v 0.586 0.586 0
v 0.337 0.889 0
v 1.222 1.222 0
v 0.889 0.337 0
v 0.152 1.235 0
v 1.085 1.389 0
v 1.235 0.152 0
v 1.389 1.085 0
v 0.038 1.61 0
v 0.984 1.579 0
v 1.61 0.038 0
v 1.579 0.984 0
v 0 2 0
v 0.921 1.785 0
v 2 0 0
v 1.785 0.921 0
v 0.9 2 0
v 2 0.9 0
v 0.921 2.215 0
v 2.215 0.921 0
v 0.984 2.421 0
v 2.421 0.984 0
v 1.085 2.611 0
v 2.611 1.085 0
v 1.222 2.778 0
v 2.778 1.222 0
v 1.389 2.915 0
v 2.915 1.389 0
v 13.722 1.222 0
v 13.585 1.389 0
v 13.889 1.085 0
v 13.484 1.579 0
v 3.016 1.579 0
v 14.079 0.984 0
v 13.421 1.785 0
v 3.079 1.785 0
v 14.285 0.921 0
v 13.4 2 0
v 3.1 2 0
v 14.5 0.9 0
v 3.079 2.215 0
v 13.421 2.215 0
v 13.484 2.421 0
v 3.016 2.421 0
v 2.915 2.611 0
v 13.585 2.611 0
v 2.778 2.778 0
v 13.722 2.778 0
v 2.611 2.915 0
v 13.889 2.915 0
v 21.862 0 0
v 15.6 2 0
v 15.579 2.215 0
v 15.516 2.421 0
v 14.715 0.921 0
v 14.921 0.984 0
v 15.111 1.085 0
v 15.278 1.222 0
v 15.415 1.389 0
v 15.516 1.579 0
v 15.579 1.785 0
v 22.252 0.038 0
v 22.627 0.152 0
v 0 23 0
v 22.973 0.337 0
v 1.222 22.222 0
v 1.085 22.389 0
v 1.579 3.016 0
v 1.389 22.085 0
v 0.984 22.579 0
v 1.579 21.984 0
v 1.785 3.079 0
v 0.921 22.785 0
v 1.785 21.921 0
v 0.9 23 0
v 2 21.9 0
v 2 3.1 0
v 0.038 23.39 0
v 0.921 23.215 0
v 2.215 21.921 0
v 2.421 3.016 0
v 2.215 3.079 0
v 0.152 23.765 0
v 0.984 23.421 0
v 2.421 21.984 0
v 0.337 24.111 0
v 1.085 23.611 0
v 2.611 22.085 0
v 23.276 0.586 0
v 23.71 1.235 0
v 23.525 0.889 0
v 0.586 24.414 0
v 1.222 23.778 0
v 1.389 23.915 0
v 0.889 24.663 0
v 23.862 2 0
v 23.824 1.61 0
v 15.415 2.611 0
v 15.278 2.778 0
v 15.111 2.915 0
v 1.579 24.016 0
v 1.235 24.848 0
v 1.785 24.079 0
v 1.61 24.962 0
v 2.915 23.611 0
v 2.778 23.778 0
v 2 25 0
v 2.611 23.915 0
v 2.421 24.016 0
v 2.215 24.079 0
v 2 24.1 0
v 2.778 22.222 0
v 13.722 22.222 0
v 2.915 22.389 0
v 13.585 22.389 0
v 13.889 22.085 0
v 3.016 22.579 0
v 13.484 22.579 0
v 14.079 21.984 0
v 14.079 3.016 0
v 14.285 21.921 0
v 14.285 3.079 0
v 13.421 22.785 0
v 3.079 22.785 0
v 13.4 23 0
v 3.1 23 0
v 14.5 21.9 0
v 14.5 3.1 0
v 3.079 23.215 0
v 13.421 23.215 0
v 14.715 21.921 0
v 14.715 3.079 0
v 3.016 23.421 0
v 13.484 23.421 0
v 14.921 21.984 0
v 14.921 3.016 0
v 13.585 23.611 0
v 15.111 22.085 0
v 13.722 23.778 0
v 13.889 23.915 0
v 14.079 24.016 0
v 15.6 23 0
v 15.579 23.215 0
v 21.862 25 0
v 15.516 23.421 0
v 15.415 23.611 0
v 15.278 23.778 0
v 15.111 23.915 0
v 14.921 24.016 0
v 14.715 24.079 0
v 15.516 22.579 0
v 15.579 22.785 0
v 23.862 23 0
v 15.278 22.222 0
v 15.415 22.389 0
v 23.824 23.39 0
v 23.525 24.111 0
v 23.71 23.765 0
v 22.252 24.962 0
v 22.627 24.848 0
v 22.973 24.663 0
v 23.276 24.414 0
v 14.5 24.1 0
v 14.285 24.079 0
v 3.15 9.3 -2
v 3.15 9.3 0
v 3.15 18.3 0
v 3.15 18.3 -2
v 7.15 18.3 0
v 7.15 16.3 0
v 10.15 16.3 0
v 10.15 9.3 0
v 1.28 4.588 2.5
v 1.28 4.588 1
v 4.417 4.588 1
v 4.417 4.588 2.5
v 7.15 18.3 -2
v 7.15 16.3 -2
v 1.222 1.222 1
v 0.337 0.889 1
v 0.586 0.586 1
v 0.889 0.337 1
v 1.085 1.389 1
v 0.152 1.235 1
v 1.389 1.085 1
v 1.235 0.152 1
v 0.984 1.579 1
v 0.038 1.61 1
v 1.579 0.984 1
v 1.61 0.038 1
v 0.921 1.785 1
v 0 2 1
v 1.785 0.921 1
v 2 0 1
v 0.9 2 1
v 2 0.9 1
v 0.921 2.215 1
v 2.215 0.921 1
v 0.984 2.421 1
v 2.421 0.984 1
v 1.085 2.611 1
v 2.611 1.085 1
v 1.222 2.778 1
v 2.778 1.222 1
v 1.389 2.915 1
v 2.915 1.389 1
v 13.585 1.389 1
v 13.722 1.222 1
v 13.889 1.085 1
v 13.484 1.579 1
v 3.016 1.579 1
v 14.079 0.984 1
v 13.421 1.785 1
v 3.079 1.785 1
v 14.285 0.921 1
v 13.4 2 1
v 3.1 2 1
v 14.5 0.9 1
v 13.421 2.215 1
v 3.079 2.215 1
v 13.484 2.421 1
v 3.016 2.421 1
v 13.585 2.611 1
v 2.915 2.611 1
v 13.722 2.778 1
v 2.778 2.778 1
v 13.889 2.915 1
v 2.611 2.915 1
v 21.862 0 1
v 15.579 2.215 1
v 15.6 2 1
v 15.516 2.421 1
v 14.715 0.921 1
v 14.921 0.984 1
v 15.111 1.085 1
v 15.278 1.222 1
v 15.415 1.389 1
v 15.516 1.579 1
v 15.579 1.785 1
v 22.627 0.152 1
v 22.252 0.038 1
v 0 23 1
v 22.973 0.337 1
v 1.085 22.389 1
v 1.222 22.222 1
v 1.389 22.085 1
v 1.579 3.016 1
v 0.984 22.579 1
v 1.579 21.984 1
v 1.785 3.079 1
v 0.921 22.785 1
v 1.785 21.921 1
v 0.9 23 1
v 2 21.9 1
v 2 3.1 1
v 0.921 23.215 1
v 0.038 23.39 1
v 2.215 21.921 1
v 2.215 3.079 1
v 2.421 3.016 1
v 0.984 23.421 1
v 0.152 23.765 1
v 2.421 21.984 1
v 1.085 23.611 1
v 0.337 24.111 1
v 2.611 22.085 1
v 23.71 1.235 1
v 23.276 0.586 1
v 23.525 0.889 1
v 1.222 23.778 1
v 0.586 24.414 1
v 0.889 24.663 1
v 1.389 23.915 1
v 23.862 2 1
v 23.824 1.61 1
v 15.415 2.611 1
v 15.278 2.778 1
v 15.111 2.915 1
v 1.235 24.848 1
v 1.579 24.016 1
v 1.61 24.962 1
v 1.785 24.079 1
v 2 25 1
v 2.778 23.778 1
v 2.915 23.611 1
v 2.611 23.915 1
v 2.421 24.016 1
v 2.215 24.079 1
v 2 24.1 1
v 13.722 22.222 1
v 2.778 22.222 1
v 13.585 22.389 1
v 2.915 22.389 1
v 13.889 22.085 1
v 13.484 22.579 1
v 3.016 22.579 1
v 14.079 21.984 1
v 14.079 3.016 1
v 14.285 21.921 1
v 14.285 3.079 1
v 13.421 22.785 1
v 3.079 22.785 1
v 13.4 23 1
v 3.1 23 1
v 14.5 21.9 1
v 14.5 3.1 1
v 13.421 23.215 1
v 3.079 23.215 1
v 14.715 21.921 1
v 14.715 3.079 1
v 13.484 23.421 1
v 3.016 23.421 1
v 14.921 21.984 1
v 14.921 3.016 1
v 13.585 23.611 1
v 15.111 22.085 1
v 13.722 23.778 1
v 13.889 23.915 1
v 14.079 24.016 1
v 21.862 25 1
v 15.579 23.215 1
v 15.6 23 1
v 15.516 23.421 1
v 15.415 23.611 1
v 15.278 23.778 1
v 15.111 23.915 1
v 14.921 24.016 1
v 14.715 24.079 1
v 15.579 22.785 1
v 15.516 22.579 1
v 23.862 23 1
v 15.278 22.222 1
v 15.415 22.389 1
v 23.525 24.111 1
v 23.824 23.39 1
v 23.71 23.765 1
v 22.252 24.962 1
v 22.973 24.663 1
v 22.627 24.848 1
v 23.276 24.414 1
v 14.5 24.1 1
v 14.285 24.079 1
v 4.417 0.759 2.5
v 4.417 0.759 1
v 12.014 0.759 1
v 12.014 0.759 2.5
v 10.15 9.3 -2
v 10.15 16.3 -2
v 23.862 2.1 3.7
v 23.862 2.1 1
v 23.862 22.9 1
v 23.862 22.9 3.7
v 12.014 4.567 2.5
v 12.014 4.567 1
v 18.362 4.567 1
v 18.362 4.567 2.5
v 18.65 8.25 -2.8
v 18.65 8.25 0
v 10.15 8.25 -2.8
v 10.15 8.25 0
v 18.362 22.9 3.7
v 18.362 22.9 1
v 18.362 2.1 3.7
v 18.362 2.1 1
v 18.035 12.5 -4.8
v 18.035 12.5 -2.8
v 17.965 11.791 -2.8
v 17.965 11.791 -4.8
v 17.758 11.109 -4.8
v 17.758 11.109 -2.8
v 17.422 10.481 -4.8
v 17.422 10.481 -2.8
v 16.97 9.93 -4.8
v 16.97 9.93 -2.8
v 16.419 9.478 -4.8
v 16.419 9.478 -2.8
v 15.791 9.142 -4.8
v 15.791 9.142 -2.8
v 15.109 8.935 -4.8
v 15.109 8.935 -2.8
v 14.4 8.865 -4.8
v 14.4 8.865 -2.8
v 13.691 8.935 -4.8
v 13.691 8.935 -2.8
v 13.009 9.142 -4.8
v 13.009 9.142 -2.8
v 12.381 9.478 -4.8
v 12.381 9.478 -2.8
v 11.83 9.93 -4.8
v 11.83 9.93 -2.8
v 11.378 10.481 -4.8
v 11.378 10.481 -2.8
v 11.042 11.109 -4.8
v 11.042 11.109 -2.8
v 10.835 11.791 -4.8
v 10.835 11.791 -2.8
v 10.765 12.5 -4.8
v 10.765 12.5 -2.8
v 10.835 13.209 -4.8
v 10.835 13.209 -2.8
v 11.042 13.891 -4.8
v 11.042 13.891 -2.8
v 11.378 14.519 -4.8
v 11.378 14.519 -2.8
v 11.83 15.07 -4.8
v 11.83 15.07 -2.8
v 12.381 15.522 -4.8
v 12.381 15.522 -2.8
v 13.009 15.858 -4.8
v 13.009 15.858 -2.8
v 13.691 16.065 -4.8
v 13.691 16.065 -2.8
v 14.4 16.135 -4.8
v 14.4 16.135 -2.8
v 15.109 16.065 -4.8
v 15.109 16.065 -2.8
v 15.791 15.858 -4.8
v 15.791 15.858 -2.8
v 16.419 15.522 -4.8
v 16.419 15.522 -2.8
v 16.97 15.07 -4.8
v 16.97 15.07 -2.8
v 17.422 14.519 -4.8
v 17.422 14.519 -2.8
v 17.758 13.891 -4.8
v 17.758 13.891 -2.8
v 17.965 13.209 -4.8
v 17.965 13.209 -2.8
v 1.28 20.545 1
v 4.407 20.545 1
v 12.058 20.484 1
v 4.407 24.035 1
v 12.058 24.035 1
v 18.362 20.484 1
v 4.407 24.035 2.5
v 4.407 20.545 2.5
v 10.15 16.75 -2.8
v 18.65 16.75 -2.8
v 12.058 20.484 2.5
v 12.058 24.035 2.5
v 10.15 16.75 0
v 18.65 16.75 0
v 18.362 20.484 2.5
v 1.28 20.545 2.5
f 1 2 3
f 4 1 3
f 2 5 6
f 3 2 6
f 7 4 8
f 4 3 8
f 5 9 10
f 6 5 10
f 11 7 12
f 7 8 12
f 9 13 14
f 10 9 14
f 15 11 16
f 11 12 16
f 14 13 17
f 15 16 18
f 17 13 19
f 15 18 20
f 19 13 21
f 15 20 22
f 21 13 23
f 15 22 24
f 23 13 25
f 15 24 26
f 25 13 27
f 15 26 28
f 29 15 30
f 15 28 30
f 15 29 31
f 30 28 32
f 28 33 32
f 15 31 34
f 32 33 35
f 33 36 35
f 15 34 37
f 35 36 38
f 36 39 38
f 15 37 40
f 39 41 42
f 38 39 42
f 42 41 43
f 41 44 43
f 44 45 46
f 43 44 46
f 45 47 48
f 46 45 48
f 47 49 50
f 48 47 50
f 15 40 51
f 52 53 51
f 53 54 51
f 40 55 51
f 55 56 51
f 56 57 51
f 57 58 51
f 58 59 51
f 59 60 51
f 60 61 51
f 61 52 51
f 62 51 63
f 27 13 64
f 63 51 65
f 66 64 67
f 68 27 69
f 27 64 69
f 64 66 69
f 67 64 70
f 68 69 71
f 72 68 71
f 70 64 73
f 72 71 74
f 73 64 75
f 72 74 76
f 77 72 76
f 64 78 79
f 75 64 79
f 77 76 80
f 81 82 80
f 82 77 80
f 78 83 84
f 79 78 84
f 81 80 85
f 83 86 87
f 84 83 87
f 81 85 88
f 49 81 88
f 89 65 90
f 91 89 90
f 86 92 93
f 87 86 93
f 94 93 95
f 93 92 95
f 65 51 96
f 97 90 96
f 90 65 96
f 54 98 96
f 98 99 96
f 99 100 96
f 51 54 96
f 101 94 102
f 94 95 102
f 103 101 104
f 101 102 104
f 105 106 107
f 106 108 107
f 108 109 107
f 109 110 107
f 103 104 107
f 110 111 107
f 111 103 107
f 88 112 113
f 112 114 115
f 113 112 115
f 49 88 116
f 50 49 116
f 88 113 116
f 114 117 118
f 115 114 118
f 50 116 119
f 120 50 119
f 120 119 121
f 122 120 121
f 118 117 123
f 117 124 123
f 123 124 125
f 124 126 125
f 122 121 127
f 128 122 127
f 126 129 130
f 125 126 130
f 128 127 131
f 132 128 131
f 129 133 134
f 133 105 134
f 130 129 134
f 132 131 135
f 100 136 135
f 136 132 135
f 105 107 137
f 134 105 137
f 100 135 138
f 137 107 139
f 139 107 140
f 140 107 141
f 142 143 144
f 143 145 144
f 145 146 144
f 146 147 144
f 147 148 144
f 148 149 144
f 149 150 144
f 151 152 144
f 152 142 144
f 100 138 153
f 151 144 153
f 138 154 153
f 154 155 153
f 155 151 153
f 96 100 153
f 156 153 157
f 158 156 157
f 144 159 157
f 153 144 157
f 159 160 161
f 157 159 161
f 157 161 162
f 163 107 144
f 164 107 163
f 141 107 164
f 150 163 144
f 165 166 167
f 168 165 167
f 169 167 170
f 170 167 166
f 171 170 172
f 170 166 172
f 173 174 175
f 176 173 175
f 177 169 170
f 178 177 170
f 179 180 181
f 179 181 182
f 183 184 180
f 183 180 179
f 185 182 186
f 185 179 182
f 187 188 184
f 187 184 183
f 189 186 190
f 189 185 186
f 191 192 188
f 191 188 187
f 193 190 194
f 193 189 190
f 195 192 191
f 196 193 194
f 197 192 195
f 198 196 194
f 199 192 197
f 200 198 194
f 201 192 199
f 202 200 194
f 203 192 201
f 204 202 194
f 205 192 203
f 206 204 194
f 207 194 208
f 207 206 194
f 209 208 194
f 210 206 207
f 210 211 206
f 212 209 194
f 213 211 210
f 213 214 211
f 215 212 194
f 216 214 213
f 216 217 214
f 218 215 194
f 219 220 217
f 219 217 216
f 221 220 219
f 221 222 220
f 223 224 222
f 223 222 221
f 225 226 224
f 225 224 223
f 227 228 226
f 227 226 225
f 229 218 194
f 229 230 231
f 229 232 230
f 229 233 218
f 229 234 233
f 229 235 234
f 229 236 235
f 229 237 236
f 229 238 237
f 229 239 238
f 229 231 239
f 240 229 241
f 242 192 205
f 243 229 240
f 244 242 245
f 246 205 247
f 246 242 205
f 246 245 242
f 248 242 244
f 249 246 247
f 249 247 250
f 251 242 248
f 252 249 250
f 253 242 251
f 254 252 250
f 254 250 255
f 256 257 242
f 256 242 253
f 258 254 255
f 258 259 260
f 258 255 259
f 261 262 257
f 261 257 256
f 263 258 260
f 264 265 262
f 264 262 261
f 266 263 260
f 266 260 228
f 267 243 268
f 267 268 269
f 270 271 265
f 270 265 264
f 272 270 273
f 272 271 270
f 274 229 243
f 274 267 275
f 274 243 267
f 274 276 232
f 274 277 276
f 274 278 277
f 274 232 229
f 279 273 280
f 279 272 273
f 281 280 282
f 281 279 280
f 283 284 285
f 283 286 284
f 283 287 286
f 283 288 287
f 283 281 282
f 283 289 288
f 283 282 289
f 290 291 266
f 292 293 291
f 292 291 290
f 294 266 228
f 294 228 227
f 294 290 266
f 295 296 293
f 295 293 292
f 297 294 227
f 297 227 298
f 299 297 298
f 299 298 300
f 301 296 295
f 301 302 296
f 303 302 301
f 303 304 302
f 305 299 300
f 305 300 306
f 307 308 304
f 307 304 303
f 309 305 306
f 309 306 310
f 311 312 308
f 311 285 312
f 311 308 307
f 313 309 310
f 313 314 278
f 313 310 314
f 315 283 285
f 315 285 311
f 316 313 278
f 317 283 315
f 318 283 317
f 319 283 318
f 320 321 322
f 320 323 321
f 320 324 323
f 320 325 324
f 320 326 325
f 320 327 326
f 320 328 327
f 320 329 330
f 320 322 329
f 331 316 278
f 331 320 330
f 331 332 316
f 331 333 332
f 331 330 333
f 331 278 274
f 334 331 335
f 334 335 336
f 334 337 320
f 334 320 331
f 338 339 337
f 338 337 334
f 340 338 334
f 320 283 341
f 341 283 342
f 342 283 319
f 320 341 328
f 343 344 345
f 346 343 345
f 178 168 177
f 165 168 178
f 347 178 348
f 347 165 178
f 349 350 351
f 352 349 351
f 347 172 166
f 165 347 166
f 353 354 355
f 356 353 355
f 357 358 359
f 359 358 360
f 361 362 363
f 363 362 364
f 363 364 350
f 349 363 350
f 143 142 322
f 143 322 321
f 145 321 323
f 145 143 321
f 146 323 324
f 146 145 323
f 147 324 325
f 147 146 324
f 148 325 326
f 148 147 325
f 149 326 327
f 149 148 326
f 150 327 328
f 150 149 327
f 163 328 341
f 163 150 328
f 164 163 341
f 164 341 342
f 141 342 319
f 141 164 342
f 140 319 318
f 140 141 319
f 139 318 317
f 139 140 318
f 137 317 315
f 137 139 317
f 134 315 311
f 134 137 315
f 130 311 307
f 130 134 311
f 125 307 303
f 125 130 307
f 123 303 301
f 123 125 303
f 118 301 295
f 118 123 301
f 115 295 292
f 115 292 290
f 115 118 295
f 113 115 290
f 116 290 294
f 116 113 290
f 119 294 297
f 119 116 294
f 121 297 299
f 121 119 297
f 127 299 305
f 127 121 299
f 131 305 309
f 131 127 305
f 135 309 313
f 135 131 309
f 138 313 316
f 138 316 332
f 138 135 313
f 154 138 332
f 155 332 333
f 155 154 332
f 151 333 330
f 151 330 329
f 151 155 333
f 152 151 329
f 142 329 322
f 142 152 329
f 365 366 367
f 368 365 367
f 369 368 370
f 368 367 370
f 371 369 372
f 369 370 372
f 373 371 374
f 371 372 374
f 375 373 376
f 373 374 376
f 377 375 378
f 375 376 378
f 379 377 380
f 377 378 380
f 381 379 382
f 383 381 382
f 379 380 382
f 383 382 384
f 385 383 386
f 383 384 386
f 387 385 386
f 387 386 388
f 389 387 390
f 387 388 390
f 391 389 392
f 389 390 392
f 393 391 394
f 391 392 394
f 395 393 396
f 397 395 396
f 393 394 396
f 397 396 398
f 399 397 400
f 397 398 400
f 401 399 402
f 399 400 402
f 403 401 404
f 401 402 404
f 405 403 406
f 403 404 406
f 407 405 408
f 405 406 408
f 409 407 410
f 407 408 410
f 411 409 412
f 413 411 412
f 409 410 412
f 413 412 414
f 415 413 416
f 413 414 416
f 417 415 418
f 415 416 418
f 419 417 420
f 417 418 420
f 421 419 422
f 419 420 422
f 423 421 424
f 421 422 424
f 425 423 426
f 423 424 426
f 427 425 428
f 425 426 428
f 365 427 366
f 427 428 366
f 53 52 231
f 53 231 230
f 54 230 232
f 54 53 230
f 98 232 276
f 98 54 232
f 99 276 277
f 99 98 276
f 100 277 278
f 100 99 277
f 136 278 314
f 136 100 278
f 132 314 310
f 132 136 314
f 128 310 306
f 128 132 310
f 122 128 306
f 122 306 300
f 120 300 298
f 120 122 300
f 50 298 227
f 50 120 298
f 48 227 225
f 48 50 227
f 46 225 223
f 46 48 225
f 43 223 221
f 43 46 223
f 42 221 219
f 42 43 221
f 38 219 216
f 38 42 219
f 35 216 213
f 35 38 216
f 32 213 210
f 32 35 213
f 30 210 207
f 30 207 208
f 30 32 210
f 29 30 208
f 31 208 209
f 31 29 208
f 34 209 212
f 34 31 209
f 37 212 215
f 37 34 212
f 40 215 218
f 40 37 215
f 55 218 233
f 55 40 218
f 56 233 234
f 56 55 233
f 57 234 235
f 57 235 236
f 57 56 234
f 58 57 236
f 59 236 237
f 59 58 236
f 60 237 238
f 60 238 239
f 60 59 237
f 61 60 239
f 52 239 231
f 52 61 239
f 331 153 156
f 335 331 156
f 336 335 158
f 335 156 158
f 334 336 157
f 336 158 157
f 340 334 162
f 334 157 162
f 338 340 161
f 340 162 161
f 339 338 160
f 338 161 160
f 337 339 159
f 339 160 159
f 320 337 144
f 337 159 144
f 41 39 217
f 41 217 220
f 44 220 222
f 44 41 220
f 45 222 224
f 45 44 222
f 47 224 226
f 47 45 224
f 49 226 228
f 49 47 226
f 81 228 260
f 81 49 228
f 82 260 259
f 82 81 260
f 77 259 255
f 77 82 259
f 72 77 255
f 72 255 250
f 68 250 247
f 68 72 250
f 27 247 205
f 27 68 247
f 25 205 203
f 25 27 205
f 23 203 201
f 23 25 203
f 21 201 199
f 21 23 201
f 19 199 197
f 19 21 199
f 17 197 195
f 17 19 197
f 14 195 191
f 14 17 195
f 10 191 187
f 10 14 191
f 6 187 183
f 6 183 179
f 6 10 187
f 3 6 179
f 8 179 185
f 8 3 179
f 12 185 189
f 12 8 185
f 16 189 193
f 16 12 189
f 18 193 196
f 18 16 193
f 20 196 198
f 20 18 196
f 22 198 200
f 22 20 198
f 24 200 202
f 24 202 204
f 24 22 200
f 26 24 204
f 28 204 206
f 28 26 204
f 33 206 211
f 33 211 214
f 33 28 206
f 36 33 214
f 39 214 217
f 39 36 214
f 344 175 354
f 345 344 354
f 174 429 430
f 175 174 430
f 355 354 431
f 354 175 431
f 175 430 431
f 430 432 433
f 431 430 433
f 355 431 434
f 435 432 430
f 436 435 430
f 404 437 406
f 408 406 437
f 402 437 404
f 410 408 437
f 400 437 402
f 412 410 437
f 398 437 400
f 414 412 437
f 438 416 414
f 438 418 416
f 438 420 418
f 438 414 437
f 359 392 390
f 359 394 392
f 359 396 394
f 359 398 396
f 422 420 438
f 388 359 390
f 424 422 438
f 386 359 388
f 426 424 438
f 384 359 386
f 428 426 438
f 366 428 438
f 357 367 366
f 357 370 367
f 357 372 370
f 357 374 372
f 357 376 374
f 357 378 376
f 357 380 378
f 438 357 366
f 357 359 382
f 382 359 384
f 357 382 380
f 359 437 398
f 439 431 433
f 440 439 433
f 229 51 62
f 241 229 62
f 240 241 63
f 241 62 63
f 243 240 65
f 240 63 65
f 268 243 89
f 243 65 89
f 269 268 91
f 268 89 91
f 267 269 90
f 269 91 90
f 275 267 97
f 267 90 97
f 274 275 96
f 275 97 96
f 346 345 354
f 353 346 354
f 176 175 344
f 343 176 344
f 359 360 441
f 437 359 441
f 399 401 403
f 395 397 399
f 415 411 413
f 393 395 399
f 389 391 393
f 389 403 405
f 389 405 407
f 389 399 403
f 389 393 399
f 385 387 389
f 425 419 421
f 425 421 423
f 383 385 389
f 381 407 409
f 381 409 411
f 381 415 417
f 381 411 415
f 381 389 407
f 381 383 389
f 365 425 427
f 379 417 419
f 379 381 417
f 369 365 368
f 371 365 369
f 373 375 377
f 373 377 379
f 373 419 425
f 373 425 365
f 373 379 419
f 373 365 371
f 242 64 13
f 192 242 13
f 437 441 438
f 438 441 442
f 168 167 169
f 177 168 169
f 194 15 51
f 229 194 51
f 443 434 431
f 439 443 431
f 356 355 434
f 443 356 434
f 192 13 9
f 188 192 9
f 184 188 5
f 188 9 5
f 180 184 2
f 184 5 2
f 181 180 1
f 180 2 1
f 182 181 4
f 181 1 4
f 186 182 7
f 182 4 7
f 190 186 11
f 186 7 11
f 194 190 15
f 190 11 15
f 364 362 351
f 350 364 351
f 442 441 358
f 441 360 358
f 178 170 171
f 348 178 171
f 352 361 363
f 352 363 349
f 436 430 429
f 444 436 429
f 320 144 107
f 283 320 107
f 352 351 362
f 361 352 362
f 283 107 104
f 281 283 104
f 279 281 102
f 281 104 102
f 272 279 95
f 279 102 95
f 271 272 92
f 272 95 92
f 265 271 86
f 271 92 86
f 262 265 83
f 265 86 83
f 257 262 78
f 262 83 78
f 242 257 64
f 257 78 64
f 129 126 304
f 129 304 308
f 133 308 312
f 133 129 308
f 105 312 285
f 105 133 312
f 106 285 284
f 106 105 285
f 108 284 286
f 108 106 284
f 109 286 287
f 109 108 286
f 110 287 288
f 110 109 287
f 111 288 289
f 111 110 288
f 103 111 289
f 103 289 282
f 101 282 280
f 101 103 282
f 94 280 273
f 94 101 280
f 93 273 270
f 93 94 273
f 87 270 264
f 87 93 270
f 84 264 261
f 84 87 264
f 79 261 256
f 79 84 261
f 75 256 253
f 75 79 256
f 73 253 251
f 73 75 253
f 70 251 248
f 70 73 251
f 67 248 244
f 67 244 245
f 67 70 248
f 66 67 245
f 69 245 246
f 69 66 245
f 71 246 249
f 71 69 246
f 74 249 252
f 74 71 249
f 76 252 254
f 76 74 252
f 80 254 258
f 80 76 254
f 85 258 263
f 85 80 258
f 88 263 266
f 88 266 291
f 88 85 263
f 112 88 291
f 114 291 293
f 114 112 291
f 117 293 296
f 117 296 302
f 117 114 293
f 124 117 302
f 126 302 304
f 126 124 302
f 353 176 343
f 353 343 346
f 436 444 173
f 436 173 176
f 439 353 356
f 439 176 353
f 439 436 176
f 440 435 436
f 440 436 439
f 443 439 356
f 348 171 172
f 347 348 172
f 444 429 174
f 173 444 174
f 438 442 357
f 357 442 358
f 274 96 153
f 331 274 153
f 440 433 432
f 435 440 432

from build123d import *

# Parameters (mm, degrees)
F0_R     = 1.1
F1_DEPTH = 1
F3_DEPTH = 2.7
F5_DEPTH = 2.8
F6_R     = 3.635
F7_DEPTH = 2
F4_W     = 3
F4_H     = 7
F8_DEPTH = 2
F9_DEPTH = 1.5


with BuildPart() as f1:
    # F0 (on Top) → F1 (new body)
    with BuildSketch(Plane.XY):
        with BuildLine():
            Line((21.862, 25), (2, 25))
            ThreePointArc((2, 25), (0.585786, 24.414214), (0, 23))
            Line((0, 23), (0, 2))
            ThreePointArc((0, 2), (0.585786, 0.585786), (2, 0))
            Line((2, 0), (21.862, 0))
            ThreePointArc((21.862, 0), (23.276214, 0.585786), (23.862, 2))
            Line((23.862, 2), (23.862, 23))
            ThreePointArc((23.862, 23), (23.276214, 24.414214), (21.862, 25))
        make_face()
        with Locations((2, 2)):
            Circle(F0_R, mode=Mode.SUBTRACT)
        with Locations((14.5, 2)):
            Circle(F0_R, mode=Mode.SUBTRACT)
        with Locations((2, 23)):
            Circle(F0_R, mode=Mode.SUBTRACT)
        with Locations((14.5, 23)):
            Circle(F0_R, mode=Mode.SUBTRACT)
    extrude(amount=F1_DEPTH)


with BuildPart() as f3:
    # F2 (on face) → F3 (new body)
    with BuildSketch(Plane.XY.offset(1)):
        Polygon((23.862, 2.1), (23.862, 22.9), (18.362, 22.9), (18.362, 20.483647), (18.362, 4.566652), (18.362, 2.1), align=None)
    extrude(amount=F3_DEPTH)


with BuildPart() as f5:
    # F4 (on face) → F5 (new body)
    with BuildSketch(Plane(origin=(0, 0, 0), x_dir=(1, 0, 0), z_dir=(0, 0, -1))):
        Polygon((10.15, -16.75), (18.65, -16.75), (18.65, -8.25), (10.15, -8.25), (10.15, -9.3), (10.15, -16.3), align=None)
    extrude(amount=F5_DEPTH)

    # F6 (on face) → F7 (join)
    with BuildSketch(Plane(origin=(0, 0, -2.8), x_dir=(1, 0, 0), z_dir=(0, 0, -1))):
        with Locations((14.4, -12.5)):
            Circle(F6_R)
    extrude(amount=F7_DEPTH)


with BuildPart() as f8:
    # F4 (on face) → F8 (new body)
    with BuildSketch(Plane(origin=(0, 0, 0), x_dir=(1, 0, 0), z_dir=(0, 0, -1))):
        Polygon((7.15, -18.3), (7.15, -16.3), (7.15, -9.3), (3.15, -9.3), (3.15, -18.3), align=None)
        with Locations((8.65, -12.8)):
            Rectangle(F4_W, F4_H)
    extrude(amount=F8_DEPTH)


with BuildPart() as f9:
    # F2 (on face) → F9 (new body)
    with BuildSketch(Plane.XY.offset(1)):
        Polygon((18.362, 4.566652), (18.362, 20.483647), (12.057766, 20.483647), (12.057766, 24.035065), (4.406919, 24.035065), (4.406919, 20.545406), (1.280087, 20.545406), (1.280087, 4.588489), (4.417327, 4.588489), (4.417327, 0.759022), (12.013837, 0.759022), (12.013837, 4.566652), align=None)
    extrude(amount=F9_DEPTH)


solid = Compound([f1.part, f3.part, f5.part, f8.part, f9.part])
